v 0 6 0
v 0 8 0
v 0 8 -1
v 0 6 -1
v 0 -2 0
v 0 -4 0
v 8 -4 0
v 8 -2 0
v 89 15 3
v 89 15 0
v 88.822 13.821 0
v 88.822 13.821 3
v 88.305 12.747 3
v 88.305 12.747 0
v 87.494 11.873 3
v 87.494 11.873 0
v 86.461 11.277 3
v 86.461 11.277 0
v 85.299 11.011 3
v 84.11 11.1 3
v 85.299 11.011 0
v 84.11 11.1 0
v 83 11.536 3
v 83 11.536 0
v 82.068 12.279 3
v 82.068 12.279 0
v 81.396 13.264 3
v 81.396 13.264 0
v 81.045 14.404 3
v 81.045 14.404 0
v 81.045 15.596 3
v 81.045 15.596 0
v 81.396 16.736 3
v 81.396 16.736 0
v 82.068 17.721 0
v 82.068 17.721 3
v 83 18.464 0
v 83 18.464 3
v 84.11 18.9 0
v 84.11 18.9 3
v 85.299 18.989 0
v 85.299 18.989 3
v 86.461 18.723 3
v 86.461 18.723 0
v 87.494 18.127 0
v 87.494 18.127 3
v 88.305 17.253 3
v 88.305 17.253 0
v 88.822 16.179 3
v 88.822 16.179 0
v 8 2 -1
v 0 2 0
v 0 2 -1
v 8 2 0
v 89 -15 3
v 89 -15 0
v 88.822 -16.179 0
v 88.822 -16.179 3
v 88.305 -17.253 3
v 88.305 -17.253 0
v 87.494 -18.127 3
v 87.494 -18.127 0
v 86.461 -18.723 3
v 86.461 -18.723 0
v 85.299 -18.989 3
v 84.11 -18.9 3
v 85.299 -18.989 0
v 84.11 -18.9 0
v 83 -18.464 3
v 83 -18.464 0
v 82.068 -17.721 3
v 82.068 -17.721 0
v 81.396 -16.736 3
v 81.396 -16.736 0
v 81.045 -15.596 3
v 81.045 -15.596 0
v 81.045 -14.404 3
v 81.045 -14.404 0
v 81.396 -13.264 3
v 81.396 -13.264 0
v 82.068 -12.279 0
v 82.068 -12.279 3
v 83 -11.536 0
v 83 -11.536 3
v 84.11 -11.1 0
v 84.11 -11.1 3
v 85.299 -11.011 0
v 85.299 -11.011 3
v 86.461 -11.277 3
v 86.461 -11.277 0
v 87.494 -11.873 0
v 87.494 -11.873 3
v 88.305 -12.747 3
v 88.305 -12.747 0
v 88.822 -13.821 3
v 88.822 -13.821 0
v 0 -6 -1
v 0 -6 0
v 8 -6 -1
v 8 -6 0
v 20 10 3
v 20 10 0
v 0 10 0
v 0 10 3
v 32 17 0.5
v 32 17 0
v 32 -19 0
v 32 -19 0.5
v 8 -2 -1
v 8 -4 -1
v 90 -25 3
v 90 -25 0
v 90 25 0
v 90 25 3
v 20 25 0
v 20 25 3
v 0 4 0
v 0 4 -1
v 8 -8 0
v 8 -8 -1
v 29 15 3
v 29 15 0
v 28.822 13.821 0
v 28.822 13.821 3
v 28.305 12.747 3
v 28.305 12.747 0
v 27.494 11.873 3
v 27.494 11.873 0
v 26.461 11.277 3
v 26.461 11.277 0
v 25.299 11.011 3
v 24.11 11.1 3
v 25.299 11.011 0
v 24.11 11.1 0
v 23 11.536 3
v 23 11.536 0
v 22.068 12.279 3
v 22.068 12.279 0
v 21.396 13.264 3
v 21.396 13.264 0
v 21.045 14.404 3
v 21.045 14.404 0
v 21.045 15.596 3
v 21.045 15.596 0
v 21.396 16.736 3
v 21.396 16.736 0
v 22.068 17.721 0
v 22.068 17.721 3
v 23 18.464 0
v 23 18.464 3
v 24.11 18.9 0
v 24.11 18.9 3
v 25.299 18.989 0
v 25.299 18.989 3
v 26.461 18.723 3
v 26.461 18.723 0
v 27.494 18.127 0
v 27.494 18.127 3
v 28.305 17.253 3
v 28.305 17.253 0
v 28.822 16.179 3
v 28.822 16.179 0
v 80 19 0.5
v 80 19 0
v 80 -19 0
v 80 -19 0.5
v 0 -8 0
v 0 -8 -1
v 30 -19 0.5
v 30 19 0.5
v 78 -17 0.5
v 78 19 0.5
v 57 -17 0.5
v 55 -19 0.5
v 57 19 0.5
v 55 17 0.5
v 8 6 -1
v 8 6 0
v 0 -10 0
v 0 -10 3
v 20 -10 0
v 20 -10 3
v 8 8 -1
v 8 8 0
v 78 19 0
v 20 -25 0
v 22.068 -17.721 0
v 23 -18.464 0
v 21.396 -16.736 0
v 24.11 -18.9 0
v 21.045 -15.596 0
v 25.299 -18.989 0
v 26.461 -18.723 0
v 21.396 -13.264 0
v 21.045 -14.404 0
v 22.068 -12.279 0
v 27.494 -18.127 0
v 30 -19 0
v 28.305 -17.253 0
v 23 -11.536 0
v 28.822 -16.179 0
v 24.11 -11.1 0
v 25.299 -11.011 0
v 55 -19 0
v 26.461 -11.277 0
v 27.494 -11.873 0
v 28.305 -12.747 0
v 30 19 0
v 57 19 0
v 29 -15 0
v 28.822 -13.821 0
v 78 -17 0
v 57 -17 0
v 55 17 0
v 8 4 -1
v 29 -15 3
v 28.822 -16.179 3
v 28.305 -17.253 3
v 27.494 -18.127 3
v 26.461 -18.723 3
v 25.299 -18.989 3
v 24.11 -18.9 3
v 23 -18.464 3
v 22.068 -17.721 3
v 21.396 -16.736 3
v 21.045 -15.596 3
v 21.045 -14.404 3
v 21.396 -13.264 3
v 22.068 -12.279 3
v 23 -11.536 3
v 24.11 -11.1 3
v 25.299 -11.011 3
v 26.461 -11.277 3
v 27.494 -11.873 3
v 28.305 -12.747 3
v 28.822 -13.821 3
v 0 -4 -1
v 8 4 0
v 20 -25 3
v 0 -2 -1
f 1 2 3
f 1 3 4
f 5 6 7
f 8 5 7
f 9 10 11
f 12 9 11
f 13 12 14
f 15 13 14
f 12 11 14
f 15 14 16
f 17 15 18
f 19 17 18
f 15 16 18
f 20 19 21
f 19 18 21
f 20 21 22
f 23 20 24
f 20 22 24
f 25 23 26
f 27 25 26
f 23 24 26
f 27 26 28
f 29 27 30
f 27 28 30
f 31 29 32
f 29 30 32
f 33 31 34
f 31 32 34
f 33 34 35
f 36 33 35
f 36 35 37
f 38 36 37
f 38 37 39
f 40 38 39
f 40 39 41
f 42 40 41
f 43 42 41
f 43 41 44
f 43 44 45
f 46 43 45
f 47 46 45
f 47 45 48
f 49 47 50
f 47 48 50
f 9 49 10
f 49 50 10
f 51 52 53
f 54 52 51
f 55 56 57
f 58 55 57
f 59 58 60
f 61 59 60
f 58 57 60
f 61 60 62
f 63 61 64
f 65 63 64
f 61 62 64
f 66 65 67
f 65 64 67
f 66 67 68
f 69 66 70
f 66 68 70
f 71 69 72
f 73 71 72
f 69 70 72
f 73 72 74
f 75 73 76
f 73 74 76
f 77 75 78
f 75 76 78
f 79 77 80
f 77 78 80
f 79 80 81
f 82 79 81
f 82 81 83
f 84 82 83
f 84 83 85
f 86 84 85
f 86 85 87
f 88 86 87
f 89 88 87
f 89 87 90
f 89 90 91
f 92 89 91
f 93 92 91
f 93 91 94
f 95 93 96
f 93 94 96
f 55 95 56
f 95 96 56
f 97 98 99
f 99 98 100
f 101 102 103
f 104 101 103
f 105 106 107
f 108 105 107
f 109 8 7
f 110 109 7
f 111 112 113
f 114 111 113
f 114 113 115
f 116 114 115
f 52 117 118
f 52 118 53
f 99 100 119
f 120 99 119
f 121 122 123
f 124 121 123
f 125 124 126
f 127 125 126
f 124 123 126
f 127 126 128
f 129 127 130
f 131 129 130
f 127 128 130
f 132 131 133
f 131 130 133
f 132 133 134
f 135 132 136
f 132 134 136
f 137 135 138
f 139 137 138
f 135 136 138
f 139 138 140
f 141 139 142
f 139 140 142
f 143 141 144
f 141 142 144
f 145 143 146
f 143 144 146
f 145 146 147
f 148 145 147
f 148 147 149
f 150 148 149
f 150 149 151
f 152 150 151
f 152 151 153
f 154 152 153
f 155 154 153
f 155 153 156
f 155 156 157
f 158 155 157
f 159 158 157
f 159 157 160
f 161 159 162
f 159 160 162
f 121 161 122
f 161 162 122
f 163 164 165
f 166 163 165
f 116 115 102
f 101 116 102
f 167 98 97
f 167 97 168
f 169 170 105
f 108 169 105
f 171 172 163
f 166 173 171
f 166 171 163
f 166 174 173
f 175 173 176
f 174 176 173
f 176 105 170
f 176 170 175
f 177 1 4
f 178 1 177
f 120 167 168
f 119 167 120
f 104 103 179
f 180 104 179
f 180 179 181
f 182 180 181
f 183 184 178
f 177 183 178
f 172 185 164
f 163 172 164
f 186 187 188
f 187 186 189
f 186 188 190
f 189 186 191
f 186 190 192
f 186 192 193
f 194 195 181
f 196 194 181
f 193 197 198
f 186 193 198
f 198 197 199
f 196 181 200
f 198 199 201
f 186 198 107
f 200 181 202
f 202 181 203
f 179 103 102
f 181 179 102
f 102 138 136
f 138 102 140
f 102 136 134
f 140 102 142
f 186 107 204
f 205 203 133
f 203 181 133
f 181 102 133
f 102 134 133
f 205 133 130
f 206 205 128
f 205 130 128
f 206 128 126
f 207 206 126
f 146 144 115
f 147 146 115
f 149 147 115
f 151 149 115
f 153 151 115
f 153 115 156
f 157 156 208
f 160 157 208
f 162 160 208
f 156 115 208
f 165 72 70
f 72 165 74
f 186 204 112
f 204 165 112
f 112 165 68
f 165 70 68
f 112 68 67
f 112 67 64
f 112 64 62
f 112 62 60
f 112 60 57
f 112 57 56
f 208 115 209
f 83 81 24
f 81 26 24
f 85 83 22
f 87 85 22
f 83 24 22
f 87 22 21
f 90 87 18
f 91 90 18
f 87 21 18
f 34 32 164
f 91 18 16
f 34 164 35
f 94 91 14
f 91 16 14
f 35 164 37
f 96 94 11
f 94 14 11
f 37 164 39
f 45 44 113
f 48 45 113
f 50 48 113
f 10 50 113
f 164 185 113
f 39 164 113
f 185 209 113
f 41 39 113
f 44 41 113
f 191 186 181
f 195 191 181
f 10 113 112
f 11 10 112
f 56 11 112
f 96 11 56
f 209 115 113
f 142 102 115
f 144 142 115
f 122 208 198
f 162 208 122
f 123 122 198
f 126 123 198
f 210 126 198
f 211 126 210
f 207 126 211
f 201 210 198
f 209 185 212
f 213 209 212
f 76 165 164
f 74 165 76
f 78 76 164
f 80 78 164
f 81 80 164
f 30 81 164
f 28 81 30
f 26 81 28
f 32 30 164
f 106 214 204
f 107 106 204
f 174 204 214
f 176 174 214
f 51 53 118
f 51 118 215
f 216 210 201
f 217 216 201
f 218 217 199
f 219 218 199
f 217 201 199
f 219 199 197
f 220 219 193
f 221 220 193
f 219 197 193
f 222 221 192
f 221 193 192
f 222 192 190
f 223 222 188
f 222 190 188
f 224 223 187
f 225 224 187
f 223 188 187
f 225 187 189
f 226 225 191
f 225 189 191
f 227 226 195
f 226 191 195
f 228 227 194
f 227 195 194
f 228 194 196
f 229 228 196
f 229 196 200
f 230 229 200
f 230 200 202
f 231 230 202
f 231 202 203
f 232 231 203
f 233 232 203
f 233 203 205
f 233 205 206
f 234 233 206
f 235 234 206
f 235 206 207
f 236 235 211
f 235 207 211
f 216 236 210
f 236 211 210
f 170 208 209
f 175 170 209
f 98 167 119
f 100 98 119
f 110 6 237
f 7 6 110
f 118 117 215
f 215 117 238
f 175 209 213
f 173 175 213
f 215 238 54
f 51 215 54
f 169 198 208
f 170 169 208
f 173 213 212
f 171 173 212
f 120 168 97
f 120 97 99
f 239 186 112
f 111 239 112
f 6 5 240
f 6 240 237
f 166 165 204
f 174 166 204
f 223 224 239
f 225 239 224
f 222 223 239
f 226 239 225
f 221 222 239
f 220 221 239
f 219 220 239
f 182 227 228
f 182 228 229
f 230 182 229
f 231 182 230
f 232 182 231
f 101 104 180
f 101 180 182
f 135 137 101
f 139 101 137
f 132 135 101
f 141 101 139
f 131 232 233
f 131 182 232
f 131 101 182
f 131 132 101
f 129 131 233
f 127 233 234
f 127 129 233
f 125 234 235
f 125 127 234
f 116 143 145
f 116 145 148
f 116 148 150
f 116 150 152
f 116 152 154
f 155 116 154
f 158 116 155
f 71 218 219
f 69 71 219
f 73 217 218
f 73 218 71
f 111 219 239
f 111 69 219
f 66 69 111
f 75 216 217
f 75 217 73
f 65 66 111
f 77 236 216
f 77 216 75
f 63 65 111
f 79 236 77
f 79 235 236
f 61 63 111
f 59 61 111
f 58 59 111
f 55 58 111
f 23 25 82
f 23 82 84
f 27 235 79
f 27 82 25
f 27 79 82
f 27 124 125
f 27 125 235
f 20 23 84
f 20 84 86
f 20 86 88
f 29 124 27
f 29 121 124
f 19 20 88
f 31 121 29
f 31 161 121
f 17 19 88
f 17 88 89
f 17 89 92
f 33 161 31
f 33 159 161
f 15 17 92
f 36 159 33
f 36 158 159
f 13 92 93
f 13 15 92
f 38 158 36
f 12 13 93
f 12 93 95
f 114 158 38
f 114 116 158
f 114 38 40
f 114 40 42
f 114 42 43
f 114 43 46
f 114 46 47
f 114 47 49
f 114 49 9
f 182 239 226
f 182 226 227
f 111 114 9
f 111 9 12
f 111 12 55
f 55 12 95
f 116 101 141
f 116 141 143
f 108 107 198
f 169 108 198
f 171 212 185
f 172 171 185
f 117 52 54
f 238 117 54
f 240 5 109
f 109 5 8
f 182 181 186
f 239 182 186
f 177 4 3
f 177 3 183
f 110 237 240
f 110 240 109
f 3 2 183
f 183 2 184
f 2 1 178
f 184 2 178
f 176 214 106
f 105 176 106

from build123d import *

# Parameters (mm, degrees)
SKETCH003_W      = 8
SKETCH003_H      = 2
EXTRUDE001_DEPTH = 1
EXTRUDE_DEPTH    = 3
SKETCH002_R      = 4
POCKET_DEPTH     = 3
POCKET001_DEPTH  = 0.5


with BuildPart() as extrude001:
    # Sketch003 → Extrude001 (new body)
    with BuildSketch(Plane(origin=(0, 0, 0), x_dir=(1, 0, 0), z_dir=(0, 0, -1))):
        with Locations((4, 7)):
            Rectangle(SKETCH003_W, SKETCH003_H)
        with Locations((4, 3)):
            Rectangle(SKETCH003_W, SKETCH003_H)
        with Locations((4, -3)):
            Rectangle(SKETCH003_W, SKETCH003_H)
        with Locations((4, -7)):
            Rectangle(SKETCH003_W, SKETCH003_H)
    extrude(amount=EXTRUDE001_DEPTH)


with BuildPart() as pocket001:
    # Sketch → Extrude (new body)
    with BuildSketch(Plane.XY):
        Polygon((0, 10), (0, -10), (20, -10), (20, -25), (90, -25), (90, 25), (20, 25), (20, 10), align=None)
    extrude(amount=EXTRUDE_DEPTH)

    # Sketch002 → Pocket (cut)
    with BuildSketch(Plane(origin=(0, 0, 0), x_dir=(1, 0, 0), z_dir=(0, 0, -1))):
        with Locations((25, 15)):
            Circle(SKETCH002_R)
        with Locations((25, -15)):
            Circle(SKETCH002_R)
        with Locations((85, -15)):
            Circle(SKETCH002_R)
        with Locations((85, 15)):
            Circle(SKETCH002_R)
    extrude(amount=-POCKET_DEPTH, mode=Mode.SUBTRACT)

    # Sketch004 → Pocket001 (cut)
    with BuildSketch(Plane(origin=(0, 0, 0), x_dir=(1, 0, 0), z_dir=(0, 0, -1))):
        Polygon((30, 19), (30, -19), (57, -19), (57, 17), (78, 17), (78, -19), (80, -19), (80, 19), (55, 19), (55, -17), (32, -17), (32, 19), align=None)
    extrude(amount=-POCKET001_DEPTH, mode=Mode.SUBTRACT)


solid = Compound([extrude001.part, pocket001.part])
